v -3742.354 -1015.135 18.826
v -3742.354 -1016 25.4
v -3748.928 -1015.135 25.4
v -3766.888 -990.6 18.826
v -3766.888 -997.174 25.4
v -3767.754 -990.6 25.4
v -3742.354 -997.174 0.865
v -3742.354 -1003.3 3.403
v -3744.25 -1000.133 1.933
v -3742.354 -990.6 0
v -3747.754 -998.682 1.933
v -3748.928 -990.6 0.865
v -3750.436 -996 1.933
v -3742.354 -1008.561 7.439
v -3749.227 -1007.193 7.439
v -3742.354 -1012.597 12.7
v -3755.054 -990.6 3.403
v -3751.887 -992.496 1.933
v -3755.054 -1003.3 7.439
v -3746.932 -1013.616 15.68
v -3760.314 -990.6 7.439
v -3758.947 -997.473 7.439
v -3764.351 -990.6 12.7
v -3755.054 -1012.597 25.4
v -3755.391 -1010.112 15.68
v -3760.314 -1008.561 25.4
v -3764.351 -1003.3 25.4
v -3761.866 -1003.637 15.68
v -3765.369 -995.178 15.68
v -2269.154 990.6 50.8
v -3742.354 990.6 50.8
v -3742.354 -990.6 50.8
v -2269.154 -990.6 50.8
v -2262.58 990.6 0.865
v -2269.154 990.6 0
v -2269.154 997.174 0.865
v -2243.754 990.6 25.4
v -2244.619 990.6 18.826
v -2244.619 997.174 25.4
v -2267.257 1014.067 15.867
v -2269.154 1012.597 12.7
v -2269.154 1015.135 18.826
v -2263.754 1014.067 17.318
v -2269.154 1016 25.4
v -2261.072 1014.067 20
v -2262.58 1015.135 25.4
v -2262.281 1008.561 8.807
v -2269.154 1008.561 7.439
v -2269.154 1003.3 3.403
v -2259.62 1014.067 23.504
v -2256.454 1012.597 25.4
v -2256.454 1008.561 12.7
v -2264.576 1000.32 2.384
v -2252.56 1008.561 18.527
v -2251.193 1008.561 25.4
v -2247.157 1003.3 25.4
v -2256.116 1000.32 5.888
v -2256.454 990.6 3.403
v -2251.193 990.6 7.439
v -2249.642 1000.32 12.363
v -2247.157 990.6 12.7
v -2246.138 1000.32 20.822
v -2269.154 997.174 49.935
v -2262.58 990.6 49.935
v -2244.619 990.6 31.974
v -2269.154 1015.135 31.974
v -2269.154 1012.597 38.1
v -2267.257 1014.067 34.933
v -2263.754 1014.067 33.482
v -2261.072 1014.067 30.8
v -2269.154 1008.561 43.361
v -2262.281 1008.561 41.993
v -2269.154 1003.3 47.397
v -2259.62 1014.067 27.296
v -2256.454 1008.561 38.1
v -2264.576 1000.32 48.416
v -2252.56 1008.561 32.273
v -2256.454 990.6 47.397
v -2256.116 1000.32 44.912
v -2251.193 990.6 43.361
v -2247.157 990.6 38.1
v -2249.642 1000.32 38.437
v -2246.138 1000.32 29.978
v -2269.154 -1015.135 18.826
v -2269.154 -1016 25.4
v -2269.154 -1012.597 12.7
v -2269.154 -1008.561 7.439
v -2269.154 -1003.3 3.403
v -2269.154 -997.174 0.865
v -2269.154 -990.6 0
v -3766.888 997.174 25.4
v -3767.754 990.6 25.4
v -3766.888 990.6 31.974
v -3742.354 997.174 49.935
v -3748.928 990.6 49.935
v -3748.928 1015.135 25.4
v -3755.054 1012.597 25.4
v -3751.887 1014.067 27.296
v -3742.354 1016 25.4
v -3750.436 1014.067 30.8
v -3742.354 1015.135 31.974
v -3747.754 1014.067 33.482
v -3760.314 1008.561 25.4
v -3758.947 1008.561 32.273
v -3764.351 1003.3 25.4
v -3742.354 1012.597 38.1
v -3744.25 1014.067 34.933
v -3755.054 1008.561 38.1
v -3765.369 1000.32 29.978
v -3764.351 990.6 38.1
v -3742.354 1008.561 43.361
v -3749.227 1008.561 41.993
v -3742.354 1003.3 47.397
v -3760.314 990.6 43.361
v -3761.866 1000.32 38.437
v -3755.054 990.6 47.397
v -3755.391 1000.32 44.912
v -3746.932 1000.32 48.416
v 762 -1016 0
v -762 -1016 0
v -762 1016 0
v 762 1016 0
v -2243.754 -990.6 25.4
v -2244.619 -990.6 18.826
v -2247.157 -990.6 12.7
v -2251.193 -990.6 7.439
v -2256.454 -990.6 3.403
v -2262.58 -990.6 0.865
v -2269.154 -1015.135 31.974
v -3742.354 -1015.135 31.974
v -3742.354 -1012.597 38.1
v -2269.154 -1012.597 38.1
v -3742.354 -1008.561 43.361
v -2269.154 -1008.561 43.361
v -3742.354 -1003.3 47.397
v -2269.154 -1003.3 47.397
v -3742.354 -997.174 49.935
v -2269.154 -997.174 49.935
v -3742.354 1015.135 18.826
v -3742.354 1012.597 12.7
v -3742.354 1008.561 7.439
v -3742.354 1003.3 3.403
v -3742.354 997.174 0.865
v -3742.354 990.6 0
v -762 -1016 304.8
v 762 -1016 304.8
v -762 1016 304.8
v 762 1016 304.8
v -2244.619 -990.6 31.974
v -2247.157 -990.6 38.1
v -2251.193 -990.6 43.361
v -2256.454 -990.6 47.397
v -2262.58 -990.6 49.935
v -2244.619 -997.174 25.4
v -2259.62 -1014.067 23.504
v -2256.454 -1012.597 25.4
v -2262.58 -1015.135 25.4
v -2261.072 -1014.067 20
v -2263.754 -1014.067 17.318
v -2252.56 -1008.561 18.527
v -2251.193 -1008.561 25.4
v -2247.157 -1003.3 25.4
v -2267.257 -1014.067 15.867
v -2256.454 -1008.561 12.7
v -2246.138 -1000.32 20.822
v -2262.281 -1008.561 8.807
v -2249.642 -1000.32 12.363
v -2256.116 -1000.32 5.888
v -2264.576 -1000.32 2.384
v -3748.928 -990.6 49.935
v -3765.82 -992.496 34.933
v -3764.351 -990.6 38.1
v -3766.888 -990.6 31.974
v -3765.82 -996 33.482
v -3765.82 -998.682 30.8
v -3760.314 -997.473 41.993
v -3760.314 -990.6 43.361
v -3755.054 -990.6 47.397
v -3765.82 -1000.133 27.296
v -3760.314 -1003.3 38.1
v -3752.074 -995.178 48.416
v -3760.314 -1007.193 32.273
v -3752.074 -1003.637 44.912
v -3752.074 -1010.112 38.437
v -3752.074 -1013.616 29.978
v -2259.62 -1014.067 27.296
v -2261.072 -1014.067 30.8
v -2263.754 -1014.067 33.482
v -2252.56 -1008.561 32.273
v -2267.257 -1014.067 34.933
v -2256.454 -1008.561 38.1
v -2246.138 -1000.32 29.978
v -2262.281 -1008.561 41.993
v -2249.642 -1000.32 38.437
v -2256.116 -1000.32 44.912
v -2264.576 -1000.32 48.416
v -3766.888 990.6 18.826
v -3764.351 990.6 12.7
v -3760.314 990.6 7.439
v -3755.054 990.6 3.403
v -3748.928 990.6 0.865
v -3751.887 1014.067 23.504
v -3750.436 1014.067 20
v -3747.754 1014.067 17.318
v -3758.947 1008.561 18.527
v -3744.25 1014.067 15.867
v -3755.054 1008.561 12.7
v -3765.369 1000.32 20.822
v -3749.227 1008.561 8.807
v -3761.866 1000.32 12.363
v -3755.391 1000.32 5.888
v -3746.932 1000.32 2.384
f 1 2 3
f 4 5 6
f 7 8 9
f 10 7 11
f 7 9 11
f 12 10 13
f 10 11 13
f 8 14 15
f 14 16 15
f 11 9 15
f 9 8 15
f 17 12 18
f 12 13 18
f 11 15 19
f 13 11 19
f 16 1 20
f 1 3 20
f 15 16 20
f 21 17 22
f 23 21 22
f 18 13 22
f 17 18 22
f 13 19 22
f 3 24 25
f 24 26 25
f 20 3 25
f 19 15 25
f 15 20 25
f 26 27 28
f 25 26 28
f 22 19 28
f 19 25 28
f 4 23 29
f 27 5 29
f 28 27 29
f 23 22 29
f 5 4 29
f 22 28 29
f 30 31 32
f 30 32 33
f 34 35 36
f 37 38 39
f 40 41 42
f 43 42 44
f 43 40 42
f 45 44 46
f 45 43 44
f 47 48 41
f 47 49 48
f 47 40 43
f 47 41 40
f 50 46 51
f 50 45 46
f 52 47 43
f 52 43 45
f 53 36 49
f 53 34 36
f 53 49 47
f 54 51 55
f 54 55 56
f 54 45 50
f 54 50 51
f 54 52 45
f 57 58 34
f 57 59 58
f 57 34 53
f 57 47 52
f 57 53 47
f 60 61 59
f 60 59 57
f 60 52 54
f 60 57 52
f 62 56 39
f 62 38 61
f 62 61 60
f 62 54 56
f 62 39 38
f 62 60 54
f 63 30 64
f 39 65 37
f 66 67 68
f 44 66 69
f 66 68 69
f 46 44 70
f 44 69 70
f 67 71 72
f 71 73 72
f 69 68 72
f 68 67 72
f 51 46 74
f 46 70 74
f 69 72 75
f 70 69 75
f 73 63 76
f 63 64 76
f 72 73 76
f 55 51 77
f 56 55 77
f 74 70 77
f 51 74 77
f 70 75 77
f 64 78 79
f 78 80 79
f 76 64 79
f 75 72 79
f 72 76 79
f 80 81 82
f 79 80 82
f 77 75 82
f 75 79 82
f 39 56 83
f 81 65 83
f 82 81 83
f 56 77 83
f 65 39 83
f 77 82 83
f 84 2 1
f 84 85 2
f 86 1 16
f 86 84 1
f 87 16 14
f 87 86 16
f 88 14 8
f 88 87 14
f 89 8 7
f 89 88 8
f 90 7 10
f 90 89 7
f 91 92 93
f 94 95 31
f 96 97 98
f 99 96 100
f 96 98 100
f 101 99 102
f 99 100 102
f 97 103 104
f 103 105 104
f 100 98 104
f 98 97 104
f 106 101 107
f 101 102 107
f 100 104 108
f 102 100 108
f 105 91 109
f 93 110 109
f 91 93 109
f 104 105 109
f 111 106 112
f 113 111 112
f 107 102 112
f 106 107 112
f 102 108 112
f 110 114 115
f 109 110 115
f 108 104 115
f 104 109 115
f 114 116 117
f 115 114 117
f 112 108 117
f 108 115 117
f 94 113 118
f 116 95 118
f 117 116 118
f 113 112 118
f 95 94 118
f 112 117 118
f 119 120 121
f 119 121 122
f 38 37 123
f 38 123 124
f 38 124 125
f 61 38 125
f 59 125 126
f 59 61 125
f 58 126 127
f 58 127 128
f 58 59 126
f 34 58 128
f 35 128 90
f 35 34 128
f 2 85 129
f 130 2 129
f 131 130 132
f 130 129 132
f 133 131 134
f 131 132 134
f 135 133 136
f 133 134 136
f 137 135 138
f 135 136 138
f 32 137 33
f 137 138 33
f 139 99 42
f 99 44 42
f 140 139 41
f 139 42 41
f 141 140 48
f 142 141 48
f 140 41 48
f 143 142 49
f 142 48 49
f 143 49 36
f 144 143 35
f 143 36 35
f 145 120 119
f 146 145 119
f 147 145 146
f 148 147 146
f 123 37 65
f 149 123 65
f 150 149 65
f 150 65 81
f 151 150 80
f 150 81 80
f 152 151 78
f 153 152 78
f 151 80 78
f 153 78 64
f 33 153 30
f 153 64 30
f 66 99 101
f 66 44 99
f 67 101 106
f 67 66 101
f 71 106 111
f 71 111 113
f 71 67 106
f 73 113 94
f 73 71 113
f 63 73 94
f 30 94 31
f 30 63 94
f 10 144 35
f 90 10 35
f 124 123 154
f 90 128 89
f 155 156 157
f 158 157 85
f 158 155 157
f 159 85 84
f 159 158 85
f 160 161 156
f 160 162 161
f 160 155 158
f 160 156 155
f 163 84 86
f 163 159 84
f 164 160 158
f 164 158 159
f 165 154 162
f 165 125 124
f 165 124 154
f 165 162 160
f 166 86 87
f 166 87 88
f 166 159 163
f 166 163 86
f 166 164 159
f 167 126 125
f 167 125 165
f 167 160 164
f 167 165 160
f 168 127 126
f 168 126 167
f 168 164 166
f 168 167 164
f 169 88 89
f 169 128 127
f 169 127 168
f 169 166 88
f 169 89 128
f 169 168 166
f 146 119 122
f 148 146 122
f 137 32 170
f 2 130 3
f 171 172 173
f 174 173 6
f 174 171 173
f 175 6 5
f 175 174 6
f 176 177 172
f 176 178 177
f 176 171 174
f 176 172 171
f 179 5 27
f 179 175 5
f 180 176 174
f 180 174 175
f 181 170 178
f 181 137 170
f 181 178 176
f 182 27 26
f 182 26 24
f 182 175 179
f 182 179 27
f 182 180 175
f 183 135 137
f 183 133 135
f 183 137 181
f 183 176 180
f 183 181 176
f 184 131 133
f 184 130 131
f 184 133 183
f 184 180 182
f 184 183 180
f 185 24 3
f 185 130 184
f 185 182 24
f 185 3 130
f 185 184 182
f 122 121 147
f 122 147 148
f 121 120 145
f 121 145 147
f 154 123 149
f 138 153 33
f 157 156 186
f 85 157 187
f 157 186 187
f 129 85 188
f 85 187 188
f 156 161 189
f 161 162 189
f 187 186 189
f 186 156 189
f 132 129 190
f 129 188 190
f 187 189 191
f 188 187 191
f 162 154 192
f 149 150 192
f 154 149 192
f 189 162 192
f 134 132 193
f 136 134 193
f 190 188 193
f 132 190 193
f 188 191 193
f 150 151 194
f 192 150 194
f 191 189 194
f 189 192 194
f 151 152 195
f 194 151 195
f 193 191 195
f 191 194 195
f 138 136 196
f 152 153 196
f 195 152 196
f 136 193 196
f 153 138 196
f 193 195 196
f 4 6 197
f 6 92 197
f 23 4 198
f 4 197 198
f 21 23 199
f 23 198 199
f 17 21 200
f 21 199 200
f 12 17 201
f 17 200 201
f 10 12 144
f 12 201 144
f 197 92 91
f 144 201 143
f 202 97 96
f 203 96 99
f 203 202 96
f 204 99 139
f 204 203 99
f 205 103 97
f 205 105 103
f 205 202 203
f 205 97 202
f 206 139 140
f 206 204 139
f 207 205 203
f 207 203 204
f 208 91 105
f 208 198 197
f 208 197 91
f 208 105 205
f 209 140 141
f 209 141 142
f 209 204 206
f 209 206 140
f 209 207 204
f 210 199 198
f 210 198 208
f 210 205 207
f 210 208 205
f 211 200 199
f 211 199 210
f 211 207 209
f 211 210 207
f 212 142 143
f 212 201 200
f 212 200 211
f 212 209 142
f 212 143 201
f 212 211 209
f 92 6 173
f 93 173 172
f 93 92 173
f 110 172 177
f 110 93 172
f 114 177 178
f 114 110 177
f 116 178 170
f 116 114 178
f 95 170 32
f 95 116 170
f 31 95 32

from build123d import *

# Parameters (mm, degrees)
F0_W     = 1524
F0_H     = 2032
F1_DEPTH = 304.8
F2_W     = 1524
F2_H     = 2032
F3_DEPTH = 50.8
F4_R     = 25.39999


# Not quite as in the source:
# - a fillet or chamfer is up to 0.001 mm smaller than in the source, because OpenCascade refuses the exact size


with BuildPart() as f1:
    # F0 (on Top) → F1 (new body)
    with BuildSketch(Plane.XY):
        Rectangle(F0_W, F0_H)
    extrude(amount=F1_DEPTH)


with BuildPart() as f3:
    # F2 (on Top) → F3 (new body)
    with BuildSketch(Plane.XY):
        with Locations((-3005.7537959279, 0)):
            Rectangle(F2_W, F2_H)
    extrude(amount=F3_DEPTH)

    # F4 (radius 25.4 in the source; OpenCascade refuses exactly that, so slightly less here)
    f4_edges = [f3.edges().sort_by_distance(p)[0] for p in [
        (-2243.753796, 0, 50.8),
        (-2243.753796, 0, 0),
        (-2243.753796, -1016, 25.4),
        (-3005.753796, -1016, 50.8),
        (-3767.753796, 0, 50.8),
        (-3767.753796, -1016, 25.4),
        (-3005.753796, -1016, 0),
        (-3767.753796, 0, 0),
        (-3767.753796, 1016, 25.4),
        (-3005.753796, 1016, 0),
        (-3005.753796, 1016, 50.8),
        (-2243.753796, 1016, 25.4),
    ]]
    fillet(f4_edges, radius=F4_R)


solid = Compound([f1.part, f3.part])
